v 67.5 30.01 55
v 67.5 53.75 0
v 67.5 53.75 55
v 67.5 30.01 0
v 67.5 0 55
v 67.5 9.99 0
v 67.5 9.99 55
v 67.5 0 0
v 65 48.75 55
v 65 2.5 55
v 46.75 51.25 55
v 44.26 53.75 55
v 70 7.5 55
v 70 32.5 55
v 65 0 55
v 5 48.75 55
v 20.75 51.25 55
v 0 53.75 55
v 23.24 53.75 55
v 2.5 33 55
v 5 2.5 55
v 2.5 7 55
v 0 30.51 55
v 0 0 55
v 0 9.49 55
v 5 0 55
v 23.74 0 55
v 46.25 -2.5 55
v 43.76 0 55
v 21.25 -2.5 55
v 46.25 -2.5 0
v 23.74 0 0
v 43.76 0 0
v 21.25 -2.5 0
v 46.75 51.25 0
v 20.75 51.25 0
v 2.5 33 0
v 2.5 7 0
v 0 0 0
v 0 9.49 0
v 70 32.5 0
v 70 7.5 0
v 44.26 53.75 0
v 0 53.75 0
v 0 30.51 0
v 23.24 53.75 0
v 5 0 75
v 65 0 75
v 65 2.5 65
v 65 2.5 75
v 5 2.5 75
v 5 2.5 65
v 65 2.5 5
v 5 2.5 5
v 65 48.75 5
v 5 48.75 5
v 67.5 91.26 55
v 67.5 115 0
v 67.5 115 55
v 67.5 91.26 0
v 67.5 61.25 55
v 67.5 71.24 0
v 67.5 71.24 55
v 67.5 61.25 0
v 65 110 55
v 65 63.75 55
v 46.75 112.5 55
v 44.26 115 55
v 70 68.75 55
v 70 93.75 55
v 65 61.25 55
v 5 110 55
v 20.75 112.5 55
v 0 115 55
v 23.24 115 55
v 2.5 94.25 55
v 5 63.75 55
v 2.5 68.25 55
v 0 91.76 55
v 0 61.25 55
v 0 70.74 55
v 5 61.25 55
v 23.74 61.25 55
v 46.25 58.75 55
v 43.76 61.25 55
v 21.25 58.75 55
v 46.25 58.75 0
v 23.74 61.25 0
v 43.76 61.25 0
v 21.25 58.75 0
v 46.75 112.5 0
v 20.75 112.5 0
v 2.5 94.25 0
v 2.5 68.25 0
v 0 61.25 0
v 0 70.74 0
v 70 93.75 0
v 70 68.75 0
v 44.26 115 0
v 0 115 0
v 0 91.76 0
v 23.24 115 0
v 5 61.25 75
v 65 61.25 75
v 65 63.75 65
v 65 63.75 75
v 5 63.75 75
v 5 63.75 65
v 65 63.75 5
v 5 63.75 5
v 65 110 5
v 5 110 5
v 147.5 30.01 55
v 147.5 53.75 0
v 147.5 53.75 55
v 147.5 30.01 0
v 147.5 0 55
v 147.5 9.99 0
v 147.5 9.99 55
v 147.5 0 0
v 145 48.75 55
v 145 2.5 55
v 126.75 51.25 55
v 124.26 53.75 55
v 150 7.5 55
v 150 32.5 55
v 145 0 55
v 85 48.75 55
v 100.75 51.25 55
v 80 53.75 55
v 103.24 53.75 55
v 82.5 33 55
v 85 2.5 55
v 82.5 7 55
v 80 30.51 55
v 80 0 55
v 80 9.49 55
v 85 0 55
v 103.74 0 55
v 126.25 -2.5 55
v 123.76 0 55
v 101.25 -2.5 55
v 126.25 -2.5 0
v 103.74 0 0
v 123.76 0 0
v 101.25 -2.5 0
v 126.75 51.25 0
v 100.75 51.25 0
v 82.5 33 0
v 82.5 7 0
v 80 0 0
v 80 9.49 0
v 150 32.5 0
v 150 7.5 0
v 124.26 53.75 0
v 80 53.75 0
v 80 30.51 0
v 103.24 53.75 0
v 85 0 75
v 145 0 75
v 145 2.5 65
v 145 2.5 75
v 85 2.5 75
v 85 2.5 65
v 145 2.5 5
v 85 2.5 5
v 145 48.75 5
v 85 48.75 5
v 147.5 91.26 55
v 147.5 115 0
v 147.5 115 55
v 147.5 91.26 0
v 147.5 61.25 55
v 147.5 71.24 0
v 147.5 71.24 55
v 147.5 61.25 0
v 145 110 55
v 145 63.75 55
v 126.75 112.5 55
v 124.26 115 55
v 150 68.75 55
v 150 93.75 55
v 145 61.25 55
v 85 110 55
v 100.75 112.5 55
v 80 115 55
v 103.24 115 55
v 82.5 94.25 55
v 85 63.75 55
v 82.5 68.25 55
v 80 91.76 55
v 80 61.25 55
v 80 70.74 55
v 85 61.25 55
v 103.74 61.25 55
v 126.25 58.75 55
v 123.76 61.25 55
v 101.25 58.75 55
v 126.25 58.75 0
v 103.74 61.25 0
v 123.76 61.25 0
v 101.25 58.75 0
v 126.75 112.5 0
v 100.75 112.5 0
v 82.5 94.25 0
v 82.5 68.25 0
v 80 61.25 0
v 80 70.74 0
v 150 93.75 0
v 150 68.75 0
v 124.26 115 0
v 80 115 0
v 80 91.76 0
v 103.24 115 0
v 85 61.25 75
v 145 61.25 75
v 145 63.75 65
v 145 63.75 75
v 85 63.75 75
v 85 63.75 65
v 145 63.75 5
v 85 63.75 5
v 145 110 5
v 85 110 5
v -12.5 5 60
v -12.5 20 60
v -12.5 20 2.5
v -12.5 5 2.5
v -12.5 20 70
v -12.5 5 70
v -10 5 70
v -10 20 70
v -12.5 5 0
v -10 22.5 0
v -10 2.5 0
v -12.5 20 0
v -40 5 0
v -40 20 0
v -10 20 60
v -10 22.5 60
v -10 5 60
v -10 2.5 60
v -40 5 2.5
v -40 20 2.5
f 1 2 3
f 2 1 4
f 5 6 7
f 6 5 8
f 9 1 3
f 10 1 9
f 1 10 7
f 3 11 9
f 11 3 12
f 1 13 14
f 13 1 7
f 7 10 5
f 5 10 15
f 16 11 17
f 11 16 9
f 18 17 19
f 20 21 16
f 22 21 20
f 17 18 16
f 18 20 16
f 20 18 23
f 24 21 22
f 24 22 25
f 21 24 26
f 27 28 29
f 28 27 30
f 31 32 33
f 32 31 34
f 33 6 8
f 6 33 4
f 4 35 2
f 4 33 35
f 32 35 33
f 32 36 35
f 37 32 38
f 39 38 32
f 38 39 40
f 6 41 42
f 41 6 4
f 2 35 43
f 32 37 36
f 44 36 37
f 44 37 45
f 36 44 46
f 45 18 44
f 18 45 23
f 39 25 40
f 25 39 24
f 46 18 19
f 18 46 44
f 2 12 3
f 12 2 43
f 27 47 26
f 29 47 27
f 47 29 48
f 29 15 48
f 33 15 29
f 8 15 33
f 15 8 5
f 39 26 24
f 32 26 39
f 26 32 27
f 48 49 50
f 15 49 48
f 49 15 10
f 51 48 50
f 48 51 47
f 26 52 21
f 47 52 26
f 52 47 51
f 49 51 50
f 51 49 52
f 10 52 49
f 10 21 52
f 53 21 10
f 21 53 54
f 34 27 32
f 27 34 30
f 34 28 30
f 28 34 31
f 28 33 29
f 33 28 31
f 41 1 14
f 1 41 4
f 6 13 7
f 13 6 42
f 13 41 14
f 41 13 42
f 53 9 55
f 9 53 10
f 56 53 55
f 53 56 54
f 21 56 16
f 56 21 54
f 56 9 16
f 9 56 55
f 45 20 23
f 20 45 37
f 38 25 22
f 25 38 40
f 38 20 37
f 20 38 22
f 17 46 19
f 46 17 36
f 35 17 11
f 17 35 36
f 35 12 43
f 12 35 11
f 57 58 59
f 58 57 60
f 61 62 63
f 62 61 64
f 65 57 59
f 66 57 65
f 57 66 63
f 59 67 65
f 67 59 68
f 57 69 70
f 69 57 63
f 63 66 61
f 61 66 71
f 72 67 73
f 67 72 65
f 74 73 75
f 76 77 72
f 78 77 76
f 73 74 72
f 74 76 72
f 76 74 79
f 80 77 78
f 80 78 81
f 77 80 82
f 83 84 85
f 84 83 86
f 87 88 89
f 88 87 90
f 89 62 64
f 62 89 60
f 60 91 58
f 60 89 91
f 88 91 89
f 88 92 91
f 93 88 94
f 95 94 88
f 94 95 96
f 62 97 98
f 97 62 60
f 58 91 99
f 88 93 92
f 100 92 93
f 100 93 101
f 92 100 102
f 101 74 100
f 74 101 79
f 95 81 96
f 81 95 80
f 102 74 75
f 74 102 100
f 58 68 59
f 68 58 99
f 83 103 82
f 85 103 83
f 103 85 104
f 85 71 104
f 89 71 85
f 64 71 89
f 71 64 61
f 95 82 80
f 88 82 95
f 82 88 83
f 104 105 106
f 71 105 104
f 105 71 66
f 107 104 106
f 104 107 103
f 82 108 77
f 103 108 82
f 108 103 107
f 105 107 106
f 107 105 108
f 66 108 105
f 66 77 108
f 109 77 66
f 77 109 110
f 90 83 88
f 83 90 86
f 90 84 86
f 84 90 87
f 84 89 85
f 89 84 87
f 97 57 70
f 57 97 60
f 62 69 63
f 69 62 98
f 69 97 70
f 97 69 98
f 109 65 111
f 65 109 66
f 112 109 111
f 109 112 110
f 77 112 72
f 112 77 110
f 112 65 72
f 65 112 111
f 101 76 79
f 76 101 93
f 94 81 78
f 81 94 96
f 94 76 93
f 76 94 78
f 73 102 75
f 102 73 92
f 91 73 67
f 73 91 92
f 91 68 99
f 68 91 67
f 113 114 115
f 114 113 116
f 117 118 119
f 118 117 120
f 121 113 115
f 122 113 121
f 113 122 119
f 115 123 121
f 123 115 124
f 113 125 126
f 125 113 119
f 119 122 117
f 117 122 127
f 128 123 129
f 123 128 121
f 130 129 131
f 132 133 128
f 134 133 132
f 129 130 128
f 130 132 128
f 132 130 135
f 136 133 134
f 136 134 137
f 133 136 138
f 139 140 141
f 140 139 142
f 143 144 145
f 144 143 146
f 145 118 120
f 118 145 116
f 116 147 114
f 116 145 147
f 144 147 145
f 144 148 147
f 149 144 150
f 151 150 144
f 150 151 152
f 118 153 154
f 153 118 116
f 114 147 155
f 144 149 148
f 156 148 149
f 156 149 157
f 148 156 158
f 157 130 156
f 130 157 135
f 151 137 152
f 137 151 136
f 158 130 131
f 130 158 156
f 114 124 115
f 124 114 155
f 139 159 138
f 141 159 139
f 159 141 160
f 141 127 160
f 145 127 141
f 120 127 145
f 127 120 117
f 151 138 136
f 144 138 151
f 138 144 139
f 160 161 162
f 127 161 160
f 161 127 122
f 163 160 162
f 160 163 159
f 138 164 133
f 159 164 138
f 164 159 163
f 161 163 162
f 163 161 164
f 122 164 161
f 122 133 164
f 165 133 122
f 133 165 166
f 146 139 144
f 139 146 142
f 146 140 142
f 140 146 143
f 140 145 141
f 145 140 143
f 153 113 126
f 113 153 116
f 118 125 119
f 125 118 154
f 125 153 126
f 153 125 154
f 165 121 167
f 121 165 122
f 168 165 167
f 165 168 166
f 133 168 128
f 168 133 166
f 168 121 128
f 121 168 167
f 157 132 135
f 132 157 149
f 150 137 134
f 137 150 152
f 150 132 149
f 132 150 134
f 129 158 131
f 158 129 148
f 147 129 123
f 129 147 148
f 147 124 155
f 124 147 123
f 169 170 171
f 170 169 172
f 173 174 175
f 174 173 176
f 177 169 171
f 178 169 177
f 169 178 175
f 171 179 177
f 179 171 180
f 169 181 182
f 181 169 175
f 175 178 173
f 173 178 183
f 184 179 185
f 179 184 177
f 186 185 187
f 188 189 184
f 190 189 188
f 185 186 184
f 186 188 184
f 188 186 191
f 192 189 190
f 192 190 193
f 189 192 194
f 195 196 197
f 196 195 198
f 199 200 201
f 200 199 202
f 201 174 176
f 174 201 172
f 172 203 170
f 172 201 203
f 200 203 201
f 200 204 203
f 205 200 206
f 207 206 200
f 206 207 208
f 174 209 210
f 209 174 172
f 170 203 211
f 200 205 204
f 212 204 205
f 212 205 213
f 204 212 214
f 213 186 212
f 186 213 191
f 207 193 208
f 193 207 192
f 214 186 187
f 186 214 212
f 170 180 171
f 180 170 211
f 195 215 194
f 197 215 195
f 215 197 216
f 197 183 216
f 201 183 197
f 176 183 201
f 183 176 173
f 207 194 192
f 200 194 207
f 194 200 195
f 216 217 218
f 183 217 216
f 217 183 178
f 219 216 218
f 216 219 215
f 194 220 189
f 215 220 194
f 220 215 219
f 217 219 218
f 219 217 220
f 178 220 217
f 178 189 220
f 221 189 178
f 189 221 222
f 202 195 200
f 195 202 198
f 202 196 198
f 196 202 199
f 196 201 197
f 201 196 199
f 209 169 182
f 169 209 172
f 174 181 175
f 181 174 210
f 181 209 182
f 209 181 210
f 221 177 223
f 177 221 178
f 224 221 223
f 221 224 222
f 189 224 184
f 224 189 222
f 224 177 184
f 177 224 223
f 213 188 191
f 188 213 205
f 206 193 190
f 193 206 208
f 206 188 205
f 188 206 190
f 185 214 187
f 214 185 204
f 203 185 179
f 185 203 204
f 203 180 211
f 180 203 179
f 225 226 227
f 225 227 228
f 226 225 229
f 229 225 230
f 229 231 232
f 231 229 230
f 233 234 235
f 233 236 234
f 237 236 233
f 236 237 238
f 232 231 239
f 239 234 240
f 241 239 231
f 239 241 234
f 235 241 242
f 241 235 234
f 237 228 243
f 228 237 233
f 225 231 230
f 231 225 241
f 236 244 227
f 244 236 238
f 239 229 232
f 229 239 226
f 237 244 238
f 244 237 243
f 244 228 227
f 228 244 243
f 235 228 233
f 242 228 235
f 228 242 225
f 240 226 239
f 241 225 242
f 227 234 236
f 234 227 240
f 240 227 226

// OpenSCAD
// Business card storage holder set

// Inside measures
businesscard_width=60;
businesscard_length=100;
businesscard_height=50;
short_businesscard_box_length = 50 - 7.5/2;

// Wall thickness
wall_thickness=5;
notch_width = 40;

module lifter(lifter_foot,lifter_width,lifter_height,lifter_thickness)
{
  lifter_x1 = 0;
  lifter_y1 = -lifter_thickness;
  lifter_x2 = lifter_thickness;
  lifter_y2 = 0;
  lifter_x3 = lifter_thickness;
  lifter_y3 = lifter_width;
  lifter_x4 = 0;
  lifter_y4 = lifter_width + lifter_thickness;

   union() { 
       cube([lifter_thickness,lifter_width,lifter_height+10]); 
       cube([lifter_foot,lifter_width,lifter_thickness]); 
       linear_extrude(height=lifter_height) 
         polygon(points=[[lifter_x1,lifter_y1],
			[lifter_x2,lifter_y2],
			[lifter_x3,lifter_y3],
			[lifter_x4,lifter_y4],
			[lifter_x1,lifter_y1]
			]);
      }
}

module notch(notch_x,notch_y,notch_z,notch_length,notch_height,notch_depth)
{
notch_x_in = 10;
notch_x_out = 7.5;

translate([notch_x,notch_y,notch_z]) linear_extrude(height=notch_height) 
  polygon(points=[[notch_x_in, 0.01],
		[notch_x_out, -notch_depth],
		[notch_length - notch_x_out, -notch_depth],
		[notch_length - notch_x_in, 0.01],
		[notch_x_in, 0.01]
		]);
}


module businesscard_box(box_width, box_length, box_height, box_wall_thickness) {
  female_scale = 1;
  difference() {
       union() {
           cube([box_width + 1.5 * box_wall_thickness, box_length + 1.5 * box_wall_thickness, box_height + box_wall_thickness]);
	   translate([box_wall_thickness,0,0]) cube([box_width, box_wall_thickness/2,box_height + box_wall_thickness + 20]);
           notch((box_width + 1.5 * box_wall_thickness) / 2 - notch_width / 2, 0, 0, notch_width, box_height + box_wall_thickness, box_wall_thickness / 2);
           translate([box_width + 1.5 * box_wall_thickness, 0, 0]) rotate(90,[0,0,1]) notch(0, 0, 0, notch_width, box_height + box_wall_thickness, box_wall_thickness / 2);
           if (box_length > short_businesscard_box_length) {
	      translate([box_width + 1.5 * box_wall_thickness, short_businesscard_box_length + 7.5, 0]) rotate(90,[0,0,1]) notch(0, 0, 0, notch_width, box_height + box_wall_thickness, box_wall_thickness / 2);
	   }
       }
       translate([box_wall_thickness, box_wall_thickness / 2, box_wall_thickness]) 
            cube([box_width, box_length, box_height + 2 * box_wall_thickness]);
       rotate(90,[0,0,1]) notch(-female_scale/2, 0, -1, notch_width + female_scale, box_height + box_wall_thickness + 2, box_wall_thickness / 2);
       if (box_length > short_businesscard_box_length) {
       	  translate([0,short_businesscard_box_length + 7.5, 0])rotate(90,[0,0,1]) notch(-female_scale/2, 0, -1, notch_width + female_scale, box_height + box_wall_thickness + 2, box_wall_thickness / 2);
	  translate([box_wall_thickness / 2, box_length / 2 - (notch_width - 17.5) / 2, box_wall_thickness / 2]) 
	      lifter(box_width / 2 + 1, notch_width - 25 + 1,box_height + 20,box_wall_thickness / 2 + 0.1);
//	      union() { 
//	           cube([box_width / 2,notch_width - 25,box_height + box_wall_thickness]); 
//                   linear_extrude(height=box_height + box_wall_thickness) 
//                        polygon(points=[[lifter_x1,lifter_y1],
//					[lifter_x2,lifter_y2],
//					[lifter_x3,lifter_y3],
//					[lifter_x4,lifter_y4],
//					[lifter_x1,lifter_y1]
//					]);
//              }
       }
       translate([-female_scale/2, box_length + 1.5 * box_wall_thickness, -0.1]) notch((box_width + 1.5 * box_wall_thickness) / 2 - notch_width / 2, 0, 0, notch_width + female_scale, box_height + box_wall_thickness + 1, box_wall_thickness / 2);
  };
}

// businesscard_box(businesscard_width, businesscard_length, businesscard_height, wall_thickness);
businesscard_box(businesscard_width, short_businesscard_box_length, businesscard_height, wall_thickness);
translate([0,short_businesscard_box_length + 7.5 + 7.5,0]) businesscard_box(businesscard_width, short_businesscard_box_length, businesscard_height, wall_thickness);
translate([80,0,0]) businesscard_box(businesscard_width, short_businesscard_box_length, businesscard_height, wall_thickness);
translate([80,short_businesscard_box_length + 7.5 + 7.5,0]) businesscard_box(businesscard_width, short_businesscard_box_length, businesscard_height, wall_thickness);

// rotate(90,[0,-1,0]) 
translate([-10,20,0]) rotate(180,[0,0,1]) lifter(businesscard_width / 2,15,businesscard_height + 10,wall_thickness / 2);
